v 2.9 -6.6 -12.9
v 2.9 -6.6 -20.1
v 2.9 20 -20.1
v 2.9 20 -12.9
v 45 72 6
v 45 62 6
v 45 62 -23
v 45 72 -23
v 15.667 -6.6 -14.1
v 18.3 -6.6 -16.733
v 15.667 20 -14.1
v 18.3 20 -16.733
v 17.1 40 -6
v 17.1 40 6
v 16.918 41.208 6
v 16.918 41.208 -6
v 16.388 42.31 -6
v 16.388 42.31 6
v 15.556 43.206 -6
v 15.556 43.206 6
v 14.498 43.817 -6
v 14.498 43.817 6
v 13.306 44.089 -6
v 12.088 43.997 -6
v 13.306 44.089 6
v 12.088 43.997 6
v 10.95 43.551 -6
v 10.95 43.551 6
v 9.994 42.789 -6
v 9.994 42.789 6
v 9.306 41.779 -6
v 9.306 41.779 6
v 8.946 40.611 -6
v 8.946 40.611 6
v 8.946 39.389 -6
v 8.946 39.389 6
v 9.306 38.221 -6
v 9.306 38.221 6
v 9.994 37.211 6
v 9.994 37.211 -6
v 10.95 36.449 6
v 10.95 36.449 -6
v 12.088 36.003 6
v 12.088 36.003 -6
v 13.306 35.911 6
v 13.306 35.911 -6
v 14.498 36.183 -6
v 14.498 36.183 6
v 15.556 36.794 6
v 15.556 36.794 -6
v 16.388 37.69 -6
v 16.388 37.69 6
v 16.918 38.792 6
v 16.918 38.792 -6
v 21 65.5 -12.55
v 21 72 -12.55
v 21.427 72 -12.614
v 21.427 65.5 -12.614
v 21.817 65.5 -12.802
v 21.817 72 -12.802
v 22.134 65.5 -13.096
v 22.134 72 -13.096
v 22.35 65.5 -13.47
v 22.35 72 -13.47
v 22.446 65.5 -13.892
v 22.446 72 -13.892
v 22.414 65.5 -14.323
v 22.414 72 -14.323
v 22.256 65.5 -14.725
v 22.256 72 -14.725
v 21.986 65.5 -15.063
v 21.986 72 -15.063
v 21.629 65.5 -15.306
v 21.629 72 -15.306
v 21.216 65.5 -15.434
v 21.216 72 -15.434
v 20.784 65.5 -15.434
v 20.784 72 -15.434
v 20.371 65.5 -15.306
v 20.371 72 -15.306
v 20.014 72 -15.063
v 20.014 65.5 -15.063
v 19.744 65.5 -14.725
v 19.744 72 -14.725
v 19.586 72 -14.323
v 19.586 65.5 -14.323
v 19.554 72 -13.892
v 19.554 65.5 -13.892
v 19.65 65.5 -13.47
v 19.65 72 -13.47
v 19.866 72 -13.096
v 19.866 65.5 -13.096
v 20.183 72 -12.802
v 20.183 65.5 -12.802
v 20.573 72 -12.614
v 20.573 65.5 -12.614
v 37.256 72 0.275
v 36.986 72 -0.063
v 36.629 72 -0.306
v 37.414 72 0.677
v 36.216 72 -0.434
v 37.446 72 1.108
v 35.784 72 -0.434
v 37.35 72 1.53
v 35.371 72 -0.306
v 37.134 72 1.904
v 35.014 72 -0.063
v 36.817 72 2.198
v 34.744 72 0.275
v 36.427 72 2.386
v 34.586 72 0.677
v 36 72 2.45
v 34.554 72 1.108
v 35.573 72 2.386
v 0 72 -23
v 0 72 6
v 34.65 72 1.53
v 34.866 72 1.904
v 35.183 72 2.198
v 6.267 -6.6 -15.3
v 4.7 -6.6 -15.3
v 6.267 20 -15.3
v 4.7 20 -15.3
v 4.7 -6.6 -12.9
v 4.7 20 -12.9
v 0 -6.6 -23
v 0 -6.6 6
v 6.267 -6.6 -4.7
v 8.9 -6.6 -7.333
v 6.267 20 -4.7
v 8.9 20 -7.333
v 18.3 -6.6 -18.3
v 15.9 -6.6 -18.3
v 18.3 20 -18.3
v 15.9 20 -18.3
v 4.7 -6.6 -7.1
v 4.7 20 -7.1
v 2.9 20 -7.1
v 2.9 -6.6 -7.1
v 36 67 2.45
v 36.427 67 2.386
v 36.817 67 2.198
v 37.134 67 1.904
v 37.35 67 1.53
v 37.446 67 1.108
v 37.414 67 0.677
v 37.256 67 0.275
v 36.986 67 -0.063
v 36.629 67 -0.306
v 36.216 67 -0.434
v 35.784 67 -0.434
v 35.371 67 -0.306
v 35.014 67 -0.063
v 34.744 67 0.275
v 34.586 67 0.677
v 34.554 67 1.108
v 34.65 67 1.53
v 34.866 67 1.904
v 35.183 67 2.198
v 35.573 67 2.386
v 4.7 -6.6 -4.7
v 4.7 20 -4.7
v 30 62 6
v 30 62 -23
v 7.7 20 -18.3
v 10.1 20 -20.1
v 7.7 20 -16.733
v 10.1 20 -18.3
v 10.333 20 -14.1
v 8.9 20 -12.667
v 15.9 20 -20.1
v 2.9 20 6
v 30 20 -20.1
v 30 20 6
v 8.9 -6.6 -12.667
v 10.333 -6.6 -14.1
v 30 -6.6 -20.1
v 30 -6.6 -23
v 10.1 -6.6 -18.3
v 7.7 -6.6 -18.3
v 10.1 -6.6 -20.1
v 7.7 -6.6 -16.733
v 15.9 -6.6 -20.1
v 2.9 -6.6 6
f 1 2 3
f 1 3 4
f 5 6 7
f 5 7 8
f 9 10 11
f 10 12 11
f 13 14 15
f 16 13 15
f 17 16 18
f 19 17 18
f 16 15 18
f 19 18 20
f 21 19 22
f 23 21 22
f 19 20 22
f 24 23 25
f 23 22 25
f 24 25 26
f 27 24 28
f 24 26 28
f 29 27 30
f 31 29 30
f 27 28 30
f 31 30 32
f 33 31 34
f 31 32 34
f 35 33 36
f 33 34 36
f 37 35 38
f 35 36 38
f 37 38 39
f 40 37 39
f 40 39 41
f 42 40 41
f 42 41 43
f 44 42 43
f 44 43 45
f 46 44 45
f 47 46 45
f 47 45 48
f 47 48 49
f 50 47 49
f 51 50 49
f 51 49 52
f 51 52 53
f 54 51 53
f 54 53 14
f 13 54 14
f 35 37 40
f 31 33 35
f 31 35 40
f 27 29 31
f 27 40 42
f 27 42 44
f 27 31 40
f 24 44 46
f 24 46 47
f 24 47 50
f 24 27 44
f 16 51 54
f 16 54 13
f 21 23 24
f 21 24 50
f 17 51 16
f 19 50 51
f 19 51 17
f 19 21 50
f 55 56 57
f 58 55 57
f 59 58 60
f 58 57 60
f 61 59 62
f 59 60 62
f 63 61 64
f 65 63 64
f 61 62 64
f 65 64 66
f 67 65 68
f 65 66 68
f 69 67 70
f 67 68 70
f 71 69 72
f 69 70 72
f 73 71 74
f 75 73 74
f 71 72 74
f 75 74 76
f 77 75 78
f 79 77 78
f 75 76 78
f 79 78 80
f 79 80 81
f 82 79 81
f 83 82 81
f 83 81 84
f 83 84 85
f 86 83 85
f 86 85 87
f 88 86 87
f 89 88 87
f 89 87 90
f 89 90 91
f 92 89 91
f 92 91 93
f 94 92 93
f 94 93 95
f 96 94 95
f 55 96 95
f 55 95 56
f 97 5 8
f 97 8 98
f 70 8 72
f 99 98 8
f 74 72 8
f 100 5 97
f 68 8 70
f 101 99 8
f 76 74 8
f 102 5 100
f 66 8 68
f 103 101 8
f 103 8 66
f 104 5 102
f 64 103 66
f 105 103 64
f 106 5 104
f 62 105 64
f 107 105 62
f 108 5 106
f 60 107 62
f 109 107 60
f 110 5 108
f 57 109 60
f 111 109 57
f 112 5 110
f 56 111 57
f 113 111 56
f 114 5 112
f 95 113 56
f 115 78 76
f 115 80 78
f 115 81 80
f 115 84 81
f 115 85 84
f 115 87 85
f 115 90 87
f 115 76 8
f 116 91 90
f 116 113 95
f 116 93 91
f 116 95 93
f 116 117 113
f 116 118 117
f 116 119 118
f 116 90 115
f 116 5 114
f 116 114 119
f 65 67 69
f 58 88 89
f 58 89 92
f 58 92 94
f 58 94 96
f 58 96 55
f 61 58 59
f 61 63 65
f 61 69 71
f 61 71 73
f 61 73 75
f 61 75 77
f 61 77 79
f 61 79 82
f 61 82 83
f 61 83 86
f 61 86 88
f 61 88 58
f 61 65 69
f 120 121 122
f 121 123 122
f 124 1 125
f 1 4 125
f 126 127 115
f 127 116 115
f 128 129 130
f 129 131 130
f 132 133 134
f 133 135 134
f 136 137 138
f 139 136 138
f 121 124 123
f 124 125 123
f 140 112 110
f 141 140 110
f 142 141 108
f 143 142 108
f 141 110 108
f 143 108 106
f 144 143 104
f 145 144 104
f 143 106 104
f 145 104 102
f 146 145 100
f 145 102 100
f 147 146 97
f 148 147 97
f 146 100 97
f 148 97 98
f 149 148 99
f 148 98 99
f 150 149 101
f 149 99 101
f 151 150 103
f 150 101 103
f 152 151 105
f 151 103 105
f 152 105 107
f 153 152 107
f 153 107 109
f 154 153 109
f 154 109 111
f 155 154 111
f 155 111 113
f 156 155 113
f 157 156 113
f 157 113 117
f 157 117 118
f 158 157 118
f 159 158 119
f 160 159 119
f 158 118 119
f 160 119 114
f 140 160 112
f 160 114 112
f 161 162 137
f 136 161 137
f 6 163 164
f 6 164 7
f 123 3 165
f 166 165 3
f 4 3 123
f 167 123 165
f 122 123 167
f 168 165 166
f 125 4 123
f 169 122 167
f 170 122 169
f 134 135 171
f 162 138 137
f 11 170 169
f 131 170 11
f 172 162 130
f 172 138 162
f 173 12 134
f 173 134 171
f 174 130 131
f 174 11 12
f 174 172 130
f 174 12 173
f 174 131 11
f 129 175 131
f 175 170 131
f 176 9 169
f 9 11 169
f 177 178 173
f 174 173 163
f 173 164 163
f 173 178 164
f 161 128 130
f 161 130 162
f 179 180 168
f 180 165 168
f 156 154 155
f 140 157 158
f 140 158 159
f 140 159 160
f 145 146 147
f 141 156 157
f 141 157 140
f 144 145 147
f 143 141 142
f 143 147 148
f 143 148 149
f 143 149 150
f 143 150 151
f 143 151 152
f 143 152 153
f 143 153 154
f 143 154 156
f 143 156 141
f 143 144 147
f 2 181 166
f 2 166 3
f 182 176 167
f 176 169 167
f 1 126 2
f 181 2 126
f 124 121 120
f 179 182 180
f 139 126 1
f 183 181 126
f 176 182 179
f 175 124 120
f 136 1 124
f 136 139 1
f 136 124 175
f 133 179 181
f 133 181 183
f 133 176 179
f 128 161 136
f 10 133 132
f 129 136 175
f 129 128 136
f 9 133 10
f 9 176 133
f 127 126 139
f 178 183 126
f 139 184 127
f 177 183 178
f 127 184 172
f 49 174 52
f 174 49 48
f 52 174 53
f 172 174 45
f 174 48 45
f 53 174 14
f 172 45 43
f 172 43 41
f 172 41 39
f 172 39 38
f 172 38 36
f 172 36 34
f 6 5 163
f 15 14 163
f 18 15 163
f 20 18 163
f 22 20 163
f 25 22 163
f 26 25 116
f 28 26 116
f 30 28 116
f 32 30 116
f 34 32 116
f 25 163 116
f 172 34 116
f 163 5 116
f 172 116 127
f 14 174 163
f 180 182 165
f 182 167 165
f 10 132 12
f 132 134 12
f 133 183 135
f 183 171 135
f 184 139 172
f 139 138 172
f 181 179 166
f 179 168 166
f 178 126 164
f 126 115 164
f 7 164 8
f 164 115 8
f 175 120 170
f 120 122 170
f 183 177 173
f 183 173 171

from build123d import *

# Parameters (mm, degrees)
SKETCH_1_W          = 30
SKETCH_1_H          = 23
EXTRUDE_1_DEPTH     = 72
SKETCH_2_W          = 27
SKETCH_2_H          = 20
CUT_EXTRUDE_1_DEPTH = 20
SKETCH_3_R          = 4.1
CUT_EXTRUDE_2_DEPTH = 6
SKETCH_7_W          = 15
SKETCH_7_H          = 10
EXTRUDE_2_DEPTH     = 23
EXTRUDE_3_DEPTH     = 20
EXTRUDE_START       = 6
SKETCH_11_R         = 4.1
EXTRUDE_5_DEPTH     = 6
SKETCH_12_R         = 1.45
CUT_EXTRUDE_3_DEPTH = 5
SKETCH_13_R         = 1.45
CUT_EXTRUDE_4_DEPTH = 1.5
SKETCH_14_W         = 7.1
SKETCH_14_H         = 0.1
SKETCH_14_W_2       = 14.1
SKETCH_14_W_3       = 0.1
SKETCH_14_H_2       = 13.1
CUT_EXTRUDE_5_DEPTH = 20
EXTRUDE_6_DEPTH     = 6.6


with BuildPart() as part:
    # 草图1 → 凸台-拉伸1 (new body)
    with BuildSketch(Plane(origin=(0, 0, 0), x_dir=(1, 0, 0), z_dir=(0, 1, 0))):
        with Locations((15, 11.5)):
            Rectangle(SKETCH_1_W, SKETCH_1_H)
    extrude(amount=EXTRUDE_1_DEPTH)

    # 草图2 → 切除-拉伸1 (cut)
    with BuildSketch(Plane.XZ):
        with Locations((16.5, -10)):
            Rectangle(SKETCH_2_W, SKETCH_2_H)
    extrude(amount=-CUT_EXTRUDE_1_DEPTH, mode=Mode.SUBTRACT)

    # 草图3 → 切除-拉伸2 (cut)
    with BuildSketch(Plane.XY):
        with Locations((13, 40)):
            Circle(SKETCH_3_R)
    extrude(amount=-CUT_EXTRUDE_2_DEPTH, mode=Mode.SUBTRACT)

    # 草图7 → 凸台-拉伸2 (add)
    with BuildSketch(Plane(origin=(0, 0, -23), x_dir=(-1, 0, 0), z_dir=(0, 0, -1))):
        with Locations((-37.5, 67)):
            Rectangle(SKETCH_7_W, SKETCH_7_H)
    extrude(amount=-EXTRUDE_2_DEPTH)

    # 草图9 → 凸台-拉伸3 (add)
    with BuildSketch(Plane.XZ.offset(-20)):
        Polygon((10.1, -20), (15.9, -20), (15.9, -18.3), (18.3, -18.3), (18.3, -16.732842713), (15.667157288, -14.1), (10.332842713, -14.1), (7.7, -16.732842713), (7.7, -18.3), (10.1, -18.3), align=None)
    extrude_3 = extrude(amount=EXTRUDE_3_DEPTH)

    # 镜向1: 凸台-拉伸3 across plane
    add(extrude_3.mirror(Plane(origin=(11.5, 0, -11.5), x_dir=(0.7071067811865478, 0, 0.7071067811865472), z_dir=(0.7071067811865475, 0, -0.7071067811865477))))

    # 草图11 → 凸台-拉伸5 (add)
    with BuildSketch(Plane.XY.offset(EXTRUDE_START)):
        Polygon((0, 0), (3, 0), (3, 20), (30, 20), (30, 62), (45, 62), (45, 72), (0, 72), align=None)
        with Locations((13, 40)):
            Circle(SKETCH_11_R, mode=Mode.SUBTRACT)
    extrude(amount=-EXTRUDE_5_DEPTH)

    # 草图12 → 切除-拉伸3 (cut)
    with BuildSketch(Plane(origin=(0, 72, 0), x_dir=(1, 0, 0), z_dir=(0, 1, 0))):
        with Locations(Location((21, 14, 0), (0, 0, 270))):
            Circle(SKETCH_12_R)
        with Locations(Location((36, -1, 0), (0, 0, 270))):
            Circle(SKETCH_12_R)
    extrude(amount=-CUT_EXTRUDE_3_DEPTH, mode=Mode.SUBTRACT)

    # 草图13 → 切除-拉伸4 (cut)
    with BuildSketch(Plane(origin=(0, 67, 0), x_dir=(1, 0, 0), z_dir=(0, 1, 0))):
        with Locations(Location((21, 14, 0), (0, 0, 270))):
            Circle(SKETCH_13_R)
    extrude(amount=-CUT_EXTRUDE_4_DEPTH, mode=Mode.SUBTRACT)

    # 草图14 → 切除-拉伸5 (cut)
    with BuildSketch(Plane.XZ):
        with Locations((6.55, -20.05)):
            Rectangle(SKETCH_14_W, SKETCH_14_H)
        Polygon((3, -12.9), (2.9, -12.9), (2.9, -20.1), (3, -20.1), (3, -20), align=None)
        with Locations((22.95, -20.05)):
            Rectangle(SKETCH_14_W_2, SKETCH_14_H)
        with Locations((2.95, -0.55)):
            Rectangle(SKETCH_14_W_3, SKETCH_14_H_2)
    extrude(amount=-CUT_EXTRUDE_5_DEPTH, mode=Mode.SUBTRACT)

    # 草图15 → 凸台-拉伸6 (add)
    with BuildSketch(Plane.XZ):
        Polygon((4.7, -7.1), (2.9, -7.1), (2.9, 6), (0, 6), (0, -23), (30, -23), (30, -20.1), (15.9, -20.1), (15.9, -18.3), (18.3, -18.3), (18.3, -16.732842713), (15.667157288, -14.1), (10.332842713, -14.1), (7.7, -16.732842713), (7.7, -18.3), (10.1, -18.3), (10.1, -20.1), (2.9, -20.1), (2.9, -12.9), (4.7, -12.9), (4.7, -15.3), (6.267157287, -15.3), (8.9, -12.667157287), (8.9, -7.332842712), (6.267157287, -4.7), (4.7, -4.7), align=None)
    extrude(amount=EXTRUDE_6_DEPTH)


solid = part.part
